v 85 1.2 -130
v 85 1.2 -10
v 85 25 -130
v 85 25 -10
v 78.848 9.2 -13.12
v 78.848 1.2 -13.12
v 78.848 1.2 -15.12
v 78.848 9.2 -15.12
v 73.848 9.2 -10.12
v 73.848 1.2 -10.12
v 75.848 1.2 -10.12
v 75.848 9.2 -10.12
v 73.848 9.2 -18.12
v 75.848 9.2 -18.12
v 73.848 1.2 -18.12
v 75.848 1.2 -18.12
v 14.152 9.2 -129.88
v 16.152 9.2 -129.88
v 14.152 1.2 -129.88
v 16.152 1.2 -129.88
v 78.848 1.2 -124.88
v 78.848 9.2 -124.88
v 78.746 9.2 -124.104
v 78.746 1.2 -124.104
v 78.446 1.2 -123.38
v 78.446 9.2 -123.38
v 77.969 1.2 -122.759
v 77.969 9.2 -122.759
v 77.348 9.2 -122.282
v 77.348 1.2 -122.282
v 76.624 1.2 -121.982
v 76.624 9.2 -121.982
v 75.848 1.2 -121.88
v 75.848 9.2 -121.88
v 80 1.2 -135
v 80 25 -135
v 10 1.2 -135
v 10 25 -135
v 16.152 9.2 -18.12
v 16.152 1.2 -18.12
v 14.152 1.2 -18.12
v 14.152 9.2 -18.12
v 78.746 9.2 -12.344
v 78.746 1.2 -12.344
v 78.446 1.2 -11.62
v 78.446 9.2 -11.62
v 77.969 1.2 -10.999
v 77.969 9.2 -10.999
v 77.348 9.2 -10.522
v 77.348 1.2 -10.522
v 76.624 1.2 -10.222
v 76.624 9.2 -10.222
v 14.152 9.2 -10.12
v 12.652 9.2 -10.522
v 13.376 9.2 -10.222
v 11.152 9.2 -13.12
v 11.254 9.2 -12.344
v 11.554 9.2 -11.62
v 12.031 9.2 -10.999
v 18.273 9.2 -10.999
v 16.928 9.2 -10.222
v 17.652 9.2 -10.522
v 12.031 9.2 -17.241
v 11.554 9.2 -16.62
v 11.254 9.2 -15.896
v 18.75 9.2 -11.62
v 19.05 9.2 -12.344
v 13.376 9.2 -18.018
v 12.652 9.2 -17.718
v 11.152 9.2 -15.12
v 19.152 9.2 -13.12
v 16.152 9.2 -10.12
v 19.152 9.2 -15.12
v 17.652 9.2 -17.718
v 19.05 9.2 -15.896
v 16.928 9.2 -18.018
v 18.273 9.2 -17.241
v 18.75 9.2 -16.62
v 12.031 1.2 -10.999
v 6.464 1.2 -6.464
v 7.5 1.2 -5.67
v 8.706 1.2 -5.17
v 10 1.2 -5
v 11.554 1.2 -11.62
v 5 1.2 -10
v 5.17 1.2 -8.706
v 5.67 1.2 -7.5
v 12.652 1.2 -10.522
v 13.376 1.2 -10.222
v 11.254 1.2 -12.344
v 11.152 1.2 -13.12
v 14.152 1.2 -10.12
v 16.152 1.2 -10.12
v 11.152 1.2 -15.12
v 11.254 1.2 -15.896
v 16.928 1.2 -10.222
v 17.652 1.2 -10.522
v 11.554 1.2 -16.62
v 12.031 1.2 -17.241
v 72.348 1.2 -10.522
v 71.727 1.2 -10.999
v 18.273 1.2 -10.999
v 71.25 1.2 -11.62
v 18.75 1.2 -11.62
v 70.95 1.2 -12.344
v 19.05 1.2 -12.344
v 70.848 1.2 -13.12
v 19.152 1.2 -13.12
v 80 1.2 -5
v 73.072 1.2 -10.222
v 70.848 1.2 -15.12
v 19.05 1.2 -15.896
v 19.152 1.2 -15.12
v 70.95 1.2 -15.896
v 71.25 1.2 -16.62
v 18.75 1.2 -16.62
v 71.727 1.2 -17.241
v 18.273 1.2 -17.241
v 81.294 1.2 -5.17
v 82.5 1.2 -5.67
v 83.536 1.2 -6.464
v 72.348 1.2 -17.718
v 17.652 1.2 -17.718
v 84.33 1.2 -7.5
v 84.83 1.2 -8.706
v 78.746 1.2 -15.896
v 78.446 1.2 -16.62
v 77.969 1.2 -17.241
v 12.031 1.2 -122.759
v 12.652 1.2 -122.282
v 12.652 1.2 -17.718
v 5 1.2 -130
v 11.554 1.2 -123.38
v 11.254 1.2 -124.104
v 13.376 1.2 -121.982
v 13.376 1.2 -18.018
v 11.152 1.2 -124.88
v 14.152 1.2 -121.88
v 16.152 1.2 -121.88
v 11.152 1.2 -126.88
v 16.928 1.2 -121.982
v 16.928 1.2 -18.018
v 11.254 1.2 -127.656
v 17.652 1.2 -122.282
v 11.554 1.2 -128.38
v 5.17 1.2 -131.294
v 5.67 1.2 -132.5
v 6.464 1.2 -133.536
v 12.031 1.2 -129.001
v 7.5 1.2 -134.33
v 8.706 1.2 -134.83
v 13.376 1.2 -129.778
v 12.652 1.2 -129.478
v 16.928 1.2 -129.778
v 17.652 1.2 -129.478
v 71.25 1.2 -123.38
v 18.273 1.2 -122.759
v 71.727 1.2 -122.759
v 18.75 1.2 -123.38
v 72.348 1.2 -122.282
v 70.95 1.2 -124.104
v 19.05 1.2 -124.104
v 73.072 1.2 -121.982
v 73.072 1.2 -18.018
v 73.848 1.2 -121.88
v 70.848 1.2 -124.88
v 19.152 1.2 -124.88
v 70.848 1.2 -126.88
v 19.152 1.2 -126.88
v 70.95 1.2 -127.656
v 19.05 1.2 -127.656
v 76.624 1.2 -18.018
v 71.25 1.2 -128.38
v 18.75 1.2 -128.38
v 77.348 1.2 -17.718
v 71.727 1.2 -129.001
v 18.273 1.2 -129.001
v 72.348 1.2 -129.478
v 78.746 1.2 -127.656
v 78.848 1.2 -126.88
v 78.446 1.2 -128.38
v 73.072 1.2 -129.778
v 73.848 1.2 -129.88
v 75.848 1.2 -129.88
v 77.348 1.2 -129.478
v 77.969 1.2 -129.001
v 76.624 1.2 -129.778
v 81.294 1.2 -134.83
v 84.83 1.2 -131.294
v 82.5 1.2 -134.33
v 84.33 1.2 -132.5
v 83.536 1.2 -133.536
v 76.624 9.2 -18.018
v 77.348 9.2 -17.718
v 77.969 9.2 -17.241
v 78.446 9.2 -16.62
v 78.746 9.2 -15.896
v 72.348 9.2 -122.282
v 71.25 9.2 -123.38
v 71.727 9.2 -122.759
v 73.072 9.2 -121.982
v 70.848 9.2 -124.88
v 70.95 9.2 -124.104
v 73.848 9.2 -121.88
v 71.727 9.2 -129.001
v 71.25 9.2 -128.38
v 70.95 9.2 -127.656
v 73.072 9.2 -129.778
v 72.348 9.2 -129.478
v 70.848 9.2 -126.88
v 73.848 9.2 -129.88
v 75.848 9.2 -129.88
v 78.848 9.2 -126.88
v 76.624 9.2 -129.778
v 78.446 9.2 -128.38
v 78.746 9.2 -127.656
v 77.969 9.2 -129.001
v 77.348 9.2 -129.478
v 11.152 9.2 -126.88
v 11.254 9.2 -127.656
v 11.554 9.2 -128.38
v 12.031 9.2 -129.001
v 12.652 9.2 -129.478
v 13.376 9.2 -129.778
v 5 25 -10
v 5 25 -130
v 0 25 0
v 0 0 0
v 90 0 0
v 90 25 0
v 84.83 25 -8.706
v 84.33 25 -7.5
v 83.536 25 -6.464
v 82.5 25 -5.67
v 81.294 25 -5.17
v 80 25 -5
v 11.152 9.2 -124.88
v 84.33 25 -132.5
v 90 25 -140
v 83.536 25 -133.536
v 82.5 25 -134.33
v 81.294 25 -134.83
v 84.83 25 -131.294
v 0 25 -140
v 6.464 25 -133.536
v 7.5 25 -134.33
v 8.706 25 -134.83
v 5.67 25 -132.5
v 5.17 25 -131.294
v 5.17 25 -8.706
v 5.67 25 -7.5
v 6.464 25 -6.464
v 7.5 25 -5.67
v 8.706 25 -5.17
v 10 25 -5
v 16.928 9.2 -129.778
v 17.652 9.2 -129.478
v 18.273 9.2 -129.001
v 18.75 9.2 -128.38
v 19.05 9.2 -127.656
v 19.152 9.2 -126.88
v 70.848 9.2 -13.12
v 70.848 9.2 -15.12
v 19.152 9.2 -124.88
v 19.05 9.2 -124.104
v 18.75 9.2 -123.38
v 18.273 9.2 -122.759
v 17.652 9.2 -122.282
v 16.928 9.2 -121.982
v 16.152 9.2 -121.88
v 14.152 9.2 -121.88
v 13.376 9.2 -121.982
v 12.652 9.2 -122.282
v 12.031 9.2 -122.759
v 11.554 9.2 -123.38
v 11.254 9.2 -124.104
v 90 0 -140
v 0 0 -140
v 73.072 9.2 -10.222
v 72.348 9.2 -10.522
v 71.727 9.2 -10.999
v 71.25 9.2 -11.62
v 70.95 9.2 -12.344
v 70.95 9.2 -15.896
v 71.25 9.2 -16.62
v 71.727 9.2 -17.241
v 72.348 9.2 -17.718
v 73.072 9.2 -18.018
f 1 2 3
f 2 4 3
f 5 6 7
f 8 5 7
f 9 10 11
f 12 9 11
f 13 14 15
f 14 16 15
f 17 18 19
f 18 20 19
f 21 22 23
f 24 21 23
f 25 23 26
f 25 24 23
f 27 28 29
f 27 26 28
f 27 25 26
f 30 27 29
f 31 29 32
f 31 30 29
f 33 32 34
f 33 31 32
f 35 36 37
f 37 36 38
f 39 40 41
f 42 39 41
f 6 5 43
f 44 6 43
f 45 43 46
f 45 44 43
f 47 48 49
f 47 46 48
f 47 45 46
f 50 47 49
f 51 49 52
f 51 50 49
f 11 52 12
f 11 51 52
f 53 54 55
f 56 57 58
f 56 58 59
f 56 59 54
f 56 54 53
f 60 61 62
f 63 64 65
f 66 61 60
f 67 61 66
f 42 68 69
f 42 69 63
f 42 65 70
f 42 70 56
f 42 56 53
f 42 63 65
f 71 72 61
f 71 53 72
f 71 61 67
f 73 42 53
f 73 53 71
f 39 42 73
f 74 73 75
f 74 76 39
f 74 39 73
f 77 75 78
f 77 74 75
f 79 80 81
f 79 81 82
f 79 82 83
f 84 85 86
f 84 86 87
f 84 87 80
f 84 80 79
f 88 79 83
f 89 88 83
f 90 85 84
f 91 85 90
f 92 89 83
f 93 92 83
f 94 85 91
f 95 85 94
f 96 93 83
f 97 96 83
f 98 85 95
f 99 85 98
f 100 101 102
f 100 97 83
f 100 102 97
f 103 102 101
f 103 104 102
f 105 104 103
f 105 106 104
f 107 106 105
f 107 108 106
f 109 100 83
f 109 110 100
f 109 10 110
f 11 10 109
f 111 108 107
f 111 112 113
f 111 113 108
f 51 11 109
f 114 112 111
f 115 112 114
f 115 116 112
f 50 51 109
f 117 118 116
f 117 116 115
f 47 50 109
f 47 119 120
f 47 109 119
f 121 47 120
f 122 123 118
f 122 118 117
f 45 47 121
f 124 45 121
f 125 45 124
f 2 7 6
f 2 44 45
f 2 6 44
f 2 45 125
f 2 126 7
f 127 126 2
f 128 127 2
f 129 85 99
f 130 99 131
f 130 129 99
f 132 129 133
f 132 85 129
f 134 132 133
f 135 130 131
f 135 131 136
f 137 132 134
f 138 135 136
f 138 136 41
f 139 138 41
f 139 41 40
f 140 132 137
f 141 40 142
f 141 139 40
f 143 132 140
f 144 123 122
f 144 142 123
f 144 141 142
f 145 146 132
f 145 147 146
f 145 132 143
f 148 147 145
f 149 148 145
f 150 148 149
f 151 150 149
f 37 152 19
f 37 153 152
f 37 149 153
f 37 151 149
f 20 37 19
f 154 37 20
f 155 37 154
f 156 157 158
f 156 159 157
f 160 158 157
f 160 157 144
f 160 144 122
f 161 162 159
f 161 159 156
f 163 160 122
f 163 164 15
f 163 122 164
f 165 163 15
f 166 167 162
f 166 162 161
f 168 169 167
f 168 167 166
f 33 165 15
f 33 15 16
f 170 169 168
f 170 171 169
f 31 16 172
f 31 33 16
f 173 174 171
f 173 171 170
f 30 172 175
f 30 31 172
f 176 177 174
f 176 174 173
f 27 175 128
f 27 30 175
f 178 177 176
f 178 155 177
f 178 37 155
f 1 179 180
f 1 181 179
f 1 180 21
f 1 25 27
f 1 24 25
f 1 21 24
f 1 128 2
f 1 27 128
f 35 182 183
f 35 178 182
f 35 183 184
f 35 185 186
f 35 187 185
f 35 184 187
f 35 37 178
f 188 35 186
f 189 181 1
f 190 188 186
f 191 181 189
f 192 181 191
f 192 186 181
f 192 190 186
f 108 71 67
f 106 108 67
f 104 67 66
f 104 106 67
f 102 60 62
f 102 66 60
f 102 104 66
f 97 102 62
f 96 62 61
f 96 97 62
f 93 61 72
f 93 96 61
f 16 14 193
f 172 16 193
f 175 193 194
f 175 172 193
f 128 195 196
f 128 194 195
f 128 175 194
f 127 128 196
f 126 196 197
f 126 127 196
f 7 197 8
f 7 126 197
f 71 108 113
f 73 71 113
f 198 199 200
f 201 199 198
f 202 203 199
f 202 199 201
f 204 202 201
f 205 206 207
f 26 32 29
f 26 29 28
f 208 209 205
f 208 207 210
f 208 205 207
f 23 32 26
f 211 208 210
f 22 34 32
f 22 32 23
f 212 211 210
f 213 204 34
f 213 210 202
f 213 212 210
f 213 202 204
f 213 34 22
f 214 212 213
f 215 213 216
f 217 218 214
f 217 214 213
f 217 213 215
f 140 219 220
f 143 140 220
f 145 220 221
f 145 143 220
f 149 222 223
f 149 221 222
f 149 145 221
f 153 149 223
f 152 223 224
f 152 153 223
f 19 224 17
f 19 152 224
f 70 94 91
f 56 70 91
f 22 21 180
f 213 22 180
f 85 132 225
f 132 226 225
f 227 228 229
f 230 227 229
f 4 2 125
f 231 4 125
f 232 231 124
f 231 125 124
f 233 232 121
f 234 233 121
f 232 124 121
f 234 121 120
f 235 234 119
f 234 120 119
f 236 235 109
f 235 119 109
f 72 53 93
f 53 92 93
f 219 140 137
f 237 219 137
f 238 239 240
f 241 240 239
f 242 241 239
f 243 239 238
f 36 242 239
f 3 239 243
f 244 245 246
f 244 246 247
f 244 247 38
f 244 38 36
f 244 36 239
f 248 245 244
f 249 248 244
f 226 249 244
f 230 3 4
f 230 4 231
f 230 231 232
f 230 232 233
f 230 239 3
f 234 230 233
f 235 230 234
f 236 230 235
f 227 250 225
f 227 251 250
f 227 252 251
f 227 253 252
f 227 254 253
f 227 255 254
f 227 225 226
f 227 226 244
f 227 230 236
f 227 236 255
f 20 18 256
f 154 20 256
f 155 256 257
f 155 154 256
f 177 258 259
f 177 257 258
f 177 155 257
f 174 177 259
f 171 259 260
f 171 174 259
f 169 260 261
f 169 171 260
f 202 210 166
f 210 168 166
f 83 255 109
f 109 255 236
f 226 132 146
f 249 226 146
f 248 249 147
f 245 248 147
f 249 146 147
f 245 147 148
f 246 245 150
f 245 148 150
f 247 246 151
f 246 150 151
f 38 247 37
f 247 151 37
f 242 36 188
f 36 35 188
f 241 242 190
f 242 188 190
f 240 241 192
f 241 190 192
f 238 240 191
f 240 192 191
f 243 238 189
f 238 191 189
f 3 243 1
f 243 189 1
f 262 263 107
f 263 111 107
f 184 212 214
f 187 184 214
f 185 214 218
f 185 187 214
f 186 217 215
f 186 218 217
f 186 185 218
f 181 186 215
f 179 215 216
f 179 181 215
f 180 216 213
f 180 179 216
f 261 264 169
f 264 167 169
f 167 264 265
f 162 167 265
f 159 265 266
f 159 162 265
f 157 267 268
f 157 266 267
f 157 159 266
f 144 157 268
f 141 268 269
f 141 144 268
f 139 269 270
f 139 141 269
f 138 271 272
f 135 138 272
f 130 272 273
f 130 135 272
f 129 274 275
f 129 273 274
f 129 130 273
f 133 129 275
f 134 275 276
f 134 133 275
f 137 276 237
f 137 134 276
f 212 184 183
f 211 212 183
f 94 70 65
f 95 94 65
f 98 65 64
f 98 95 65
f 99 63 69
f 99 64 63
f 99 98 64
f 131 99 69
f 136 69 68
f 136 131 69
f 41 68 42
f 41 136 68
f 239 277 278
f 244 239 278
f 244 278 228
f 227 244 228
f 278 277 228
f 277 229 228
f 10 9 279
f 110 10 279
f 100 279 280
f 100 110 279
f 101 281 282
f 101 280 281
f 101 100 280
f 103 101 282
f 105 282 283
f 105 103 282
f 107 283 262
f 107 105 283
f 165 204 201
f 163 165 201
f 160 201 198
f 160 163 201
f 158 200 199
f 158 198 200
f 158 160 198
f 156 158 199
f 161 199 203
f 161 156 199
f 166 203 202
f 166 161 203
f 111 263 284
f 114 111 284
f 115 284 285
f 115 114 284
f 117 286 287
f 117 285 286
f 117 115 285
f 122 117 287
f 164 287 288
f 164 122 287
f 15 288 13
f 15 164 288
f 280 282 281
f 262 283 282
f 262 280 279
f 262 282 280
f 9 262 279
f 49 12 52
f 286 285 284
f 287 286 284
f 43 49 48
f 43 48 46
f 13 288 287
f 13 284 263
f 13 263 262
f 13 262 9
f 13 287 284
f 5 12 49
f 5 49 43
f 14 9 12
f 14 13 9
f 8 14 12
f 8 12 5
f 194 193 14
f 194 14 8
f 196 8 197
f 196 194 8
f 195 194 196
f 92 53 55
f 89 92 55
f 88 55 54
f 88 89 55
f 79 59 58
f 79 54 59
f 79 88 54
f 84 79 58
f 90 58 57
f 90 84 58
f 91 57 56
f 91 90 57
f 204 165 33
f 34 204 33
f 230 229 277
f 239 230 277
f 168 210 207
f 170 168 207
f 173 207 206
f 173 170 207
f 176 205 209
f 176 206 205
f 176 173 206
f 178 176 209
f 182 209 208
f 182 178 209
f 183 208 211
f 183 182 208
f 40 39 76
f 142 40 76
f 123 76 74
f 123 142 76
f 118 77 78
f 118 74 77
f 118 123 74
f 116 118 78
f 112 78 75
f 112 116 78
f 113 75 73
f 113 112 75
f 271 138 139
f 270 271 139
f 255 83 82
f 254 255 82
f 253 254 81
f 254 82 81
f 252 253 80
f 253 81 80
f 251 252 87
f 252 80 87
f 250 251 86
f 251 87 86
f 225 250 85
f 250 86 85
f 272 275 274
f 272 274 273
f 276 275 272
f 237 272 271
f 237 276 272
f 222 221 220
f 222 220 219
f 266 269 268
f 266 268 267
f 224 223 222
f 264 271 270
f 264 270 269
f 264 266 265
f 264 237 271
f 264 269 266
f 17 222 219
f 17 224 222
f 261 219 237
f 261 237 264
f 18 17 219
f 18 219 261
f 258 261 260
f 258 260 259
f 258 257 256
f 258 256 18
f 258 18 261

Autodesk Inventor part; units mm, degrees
ref_plane "YZ Plane" through (0, 0, 0) normal (1, 0, 0) x (0, 1, 0)
ref_plane "XZ Plane" through (0, 0, 0) normal (0, 1, 0) x (-1, 0, 0)
ref_plane "XY Plane" through (0, 0, 0) normal (0, 0, 1) x (1, 0, 0)
sketch "草图1" plane through (0, 0, 0) normal (0, 1, 0) x (-1, 0, 0)
  line L0 (0, 0) -> (-90, 0)
  line L1 (-90, 0) -> (-90, -140)
  line L2 (-90, -140) -> (0, -140)
  line L3 (0, -140) -> (0, 0)
  point P0 (-45, -70)
  dimension "d0" = 140
  dimension "d1" = 90
extrude "拉伸1" add sketch "草图1" along normal blind 25
sketch "草图2" plane through (0, 25, 0) normal (0, 1, 0) x (1, 0, 0)
  line L0 (90, 0) -> (90, 140) projected
  line L1 (90, 140) -> (0, 140) projected
  line L2 (0, 140) -> (0, 0) projected
  line L3 (0, 0) -> (90, 0) projected
  line L4 (5, 5) -> (85, 5)
  line L5 (85, 5) -> (85, 135)
  line L6 (85, 135) -> (5, 135)
  line L7 (5, 135) -> (5, 5)
  line L8 (5, 5) -> (85, 135) construction
  line L9 (85, 5) -> (5, 135) construction
  point P0 (45, 70)
  dimension "d4" = 80
  dimension "d5" = 130
extrude "拉伸2" cut sketch "草图2" against normal blind 23.8 contours L7 L6 L5 L4
fillet "面圆角1" radius 5 1 edges at (5, 13.1, -5)
fillet "面圆角2" radius 5 1 edges at (5, 13.1, -135)
fillet "面圆角3" radius 5 1 edges at (85, 13.1, -135)
fillet "面圆角4" radius 5 1 edges at (85, 13.1, -5)
sketch "草图4" plane through (0, 1.2, 0) normal (0, 1, 0) x (1, 0, 0)
  arc A0 (80, 5) -> (85, 10) centre (80, 10) ccw projected
  line L0 (85, 130) -> (85, 10) projected
  arc A1 (85, 130) -> (80, 135) centre (80, 130) ccw projected
  line L1 (10, 135) -> (80, 135) projected
  arc A2 (10, 135) -> (5, 130) centre (10, 130) ccw projected
  line L2 (5, 10) -> (5, 130) projected
  arc A3 (5, 10) -> (10, 5) centre (10, 10) ccw projected
  line L3 (80, 5) -> (10, 5) projected
  line L4 (16.152, 18.12) -> (14.152, 18.12)
  line L5 (11.152, 15.12) -> (11.152, 13.12)
  line L6 (14.152, 10.12) -> (16.152, 10.12)
  line L7 (19.152, 13.12) -> (19.152, 15.12)
  line L8 (19.152, 18.12) -> (11.152, 10.12) construction
  line L9 (11.152, 18.12) -> (19.152, 10.12) construction
  arc A4 (11.152, 13.12) -> (14.152, 10.12) centre (14.152, 13.12) ccw
  arc A5 (16.152, 10.12) -> (19.152, 13.12) centre (16.152, 13.12) ccw
  arc A6 (19.152, 15.12) -> (16.152, 18.12) centre (16.152, 15.12) ccw
  arc A7 (14.152, 18.12) -> (11.152, 15.12) centre (14.152, 15.12) ccw
  line L10 (15.152, 14.12) -> (74.848, 14.12)
  line L11 (15.152, 14.12) -> (15.152, 125.88)
  line L12 (70.848, 15.12) -> (70.848, 13.12)
  arc A8 (70.848, 13.12) -> (73.848, 10.12) centre (73.848, 13.12) ccw
  line L13 (73.848, 10.12) -> (75.848, 10.12)
  arc A9 (75.848, 10.12) -> (78.848, 13.12) centre (75.848, 13.12) ccw
  line L14 (78.848, 13.12) -> (78.848, 15.12)
  arc A10 (78.848, 15.12) -> (75.848, 18.12) centre (75.848, 15.12) ccw
  line L15 (75.848, 18.12) -> (73.848, 18.12)
  arc A11 (73.848, 18.12) -> (70.848, 15.12) centre (73.848, 15.12) ccw
  line L16 (11.152, 126.88) -> (11.152, 124.88)
  arc A12 (11.152, 124.88) -> (14.152, 121.88) centre (14.152, 124.88) ccw
  line L17 (14.152, 121.88) -> (16.152, 121.88)
  arc A13 (16.152, 121.88) -> (19.152, 124.88) centre (16.152, 124.88) ccw
  line L18 (19.152, 124.88) -> (19.152, 126.88)
  arc A14 (19.152, 126.88) -> (16.152, 129.88) centre (16.152, 126.88) ccw
  line L19 (16.152, 129.88) -> (14.152, 129.88)
  arc A15 (14.152, 129.88) -> (11.152, 126.88) centre (14.152, 126.88) ccw
  line L20 (70.848, 126.88) -> (70.848, 124.88)
  arc A16 (70.848, 124.88) -> (73.848, 121.88) centre (73.848, 124.88) ccw
  line L21 (73.848, 121.88) -> (75.848, 121.88)
  arc A17 (75.848, 121.88) -> (78.848, 124.88) centre (75.848, 124.88) ccw
  line L22 (78.848, 124.88) -> (78.848, 126.88)
  arc A18 (78.848, 126.88) -> (75.848, 129.88) centre (75.848, 126.88) ccw
  line L23 (75.848, 129.88) -> (73.848, 129.88)
  arc A19 (73.848, 129.88) -> (70.848, 126.88) centre (73.848, 126.88) ccw
  point P0 (0, 0)
  point P1 (45, 70)
  point P2 (45, 70)
  point P3 (70.848, 10.12)
  point P4 (70.848, 18.12)
  point P5 (78.848, 10.12)
  point P6 (78.848, 18.12)
  point P7 (11.152, 121.88)
  point P8 (11.152, 129.88)
  point P9 (19.152, 121.88)
  point P10 (19.152, 129.88)
  point P11 (70.848, 121.88)
  point P12 (70.848, 129.88)
  point P13 (78.848, 121.88)
  point P14 (78.848, 129.88)
  dimension "d12" = 55.88
  dimension "d13" = 29.848
  dimension "d14" = 8
  dimension "d15" = 8
  dimension "d16" = 3
  dimension "d17" = 59.696
  dimension "d18" = 111.76
  dimension "d21" = 59.696
  dimension "d24" = 111.76
extrude "拉伸3" add sketch "草图4" along normal blind 8 contours A6 L7 L10 L11 L4 | L11 L10 L7 A5 L6 A4 L5 A7 L4 | A11 L15 A10 L14 A9 L13 A8 L12 | A15 L19 A14 L18 A13 L17 A12 L16 | A19 L23 A18 L22 A17 L21 A16 L20
properties part number "PrismGC"
